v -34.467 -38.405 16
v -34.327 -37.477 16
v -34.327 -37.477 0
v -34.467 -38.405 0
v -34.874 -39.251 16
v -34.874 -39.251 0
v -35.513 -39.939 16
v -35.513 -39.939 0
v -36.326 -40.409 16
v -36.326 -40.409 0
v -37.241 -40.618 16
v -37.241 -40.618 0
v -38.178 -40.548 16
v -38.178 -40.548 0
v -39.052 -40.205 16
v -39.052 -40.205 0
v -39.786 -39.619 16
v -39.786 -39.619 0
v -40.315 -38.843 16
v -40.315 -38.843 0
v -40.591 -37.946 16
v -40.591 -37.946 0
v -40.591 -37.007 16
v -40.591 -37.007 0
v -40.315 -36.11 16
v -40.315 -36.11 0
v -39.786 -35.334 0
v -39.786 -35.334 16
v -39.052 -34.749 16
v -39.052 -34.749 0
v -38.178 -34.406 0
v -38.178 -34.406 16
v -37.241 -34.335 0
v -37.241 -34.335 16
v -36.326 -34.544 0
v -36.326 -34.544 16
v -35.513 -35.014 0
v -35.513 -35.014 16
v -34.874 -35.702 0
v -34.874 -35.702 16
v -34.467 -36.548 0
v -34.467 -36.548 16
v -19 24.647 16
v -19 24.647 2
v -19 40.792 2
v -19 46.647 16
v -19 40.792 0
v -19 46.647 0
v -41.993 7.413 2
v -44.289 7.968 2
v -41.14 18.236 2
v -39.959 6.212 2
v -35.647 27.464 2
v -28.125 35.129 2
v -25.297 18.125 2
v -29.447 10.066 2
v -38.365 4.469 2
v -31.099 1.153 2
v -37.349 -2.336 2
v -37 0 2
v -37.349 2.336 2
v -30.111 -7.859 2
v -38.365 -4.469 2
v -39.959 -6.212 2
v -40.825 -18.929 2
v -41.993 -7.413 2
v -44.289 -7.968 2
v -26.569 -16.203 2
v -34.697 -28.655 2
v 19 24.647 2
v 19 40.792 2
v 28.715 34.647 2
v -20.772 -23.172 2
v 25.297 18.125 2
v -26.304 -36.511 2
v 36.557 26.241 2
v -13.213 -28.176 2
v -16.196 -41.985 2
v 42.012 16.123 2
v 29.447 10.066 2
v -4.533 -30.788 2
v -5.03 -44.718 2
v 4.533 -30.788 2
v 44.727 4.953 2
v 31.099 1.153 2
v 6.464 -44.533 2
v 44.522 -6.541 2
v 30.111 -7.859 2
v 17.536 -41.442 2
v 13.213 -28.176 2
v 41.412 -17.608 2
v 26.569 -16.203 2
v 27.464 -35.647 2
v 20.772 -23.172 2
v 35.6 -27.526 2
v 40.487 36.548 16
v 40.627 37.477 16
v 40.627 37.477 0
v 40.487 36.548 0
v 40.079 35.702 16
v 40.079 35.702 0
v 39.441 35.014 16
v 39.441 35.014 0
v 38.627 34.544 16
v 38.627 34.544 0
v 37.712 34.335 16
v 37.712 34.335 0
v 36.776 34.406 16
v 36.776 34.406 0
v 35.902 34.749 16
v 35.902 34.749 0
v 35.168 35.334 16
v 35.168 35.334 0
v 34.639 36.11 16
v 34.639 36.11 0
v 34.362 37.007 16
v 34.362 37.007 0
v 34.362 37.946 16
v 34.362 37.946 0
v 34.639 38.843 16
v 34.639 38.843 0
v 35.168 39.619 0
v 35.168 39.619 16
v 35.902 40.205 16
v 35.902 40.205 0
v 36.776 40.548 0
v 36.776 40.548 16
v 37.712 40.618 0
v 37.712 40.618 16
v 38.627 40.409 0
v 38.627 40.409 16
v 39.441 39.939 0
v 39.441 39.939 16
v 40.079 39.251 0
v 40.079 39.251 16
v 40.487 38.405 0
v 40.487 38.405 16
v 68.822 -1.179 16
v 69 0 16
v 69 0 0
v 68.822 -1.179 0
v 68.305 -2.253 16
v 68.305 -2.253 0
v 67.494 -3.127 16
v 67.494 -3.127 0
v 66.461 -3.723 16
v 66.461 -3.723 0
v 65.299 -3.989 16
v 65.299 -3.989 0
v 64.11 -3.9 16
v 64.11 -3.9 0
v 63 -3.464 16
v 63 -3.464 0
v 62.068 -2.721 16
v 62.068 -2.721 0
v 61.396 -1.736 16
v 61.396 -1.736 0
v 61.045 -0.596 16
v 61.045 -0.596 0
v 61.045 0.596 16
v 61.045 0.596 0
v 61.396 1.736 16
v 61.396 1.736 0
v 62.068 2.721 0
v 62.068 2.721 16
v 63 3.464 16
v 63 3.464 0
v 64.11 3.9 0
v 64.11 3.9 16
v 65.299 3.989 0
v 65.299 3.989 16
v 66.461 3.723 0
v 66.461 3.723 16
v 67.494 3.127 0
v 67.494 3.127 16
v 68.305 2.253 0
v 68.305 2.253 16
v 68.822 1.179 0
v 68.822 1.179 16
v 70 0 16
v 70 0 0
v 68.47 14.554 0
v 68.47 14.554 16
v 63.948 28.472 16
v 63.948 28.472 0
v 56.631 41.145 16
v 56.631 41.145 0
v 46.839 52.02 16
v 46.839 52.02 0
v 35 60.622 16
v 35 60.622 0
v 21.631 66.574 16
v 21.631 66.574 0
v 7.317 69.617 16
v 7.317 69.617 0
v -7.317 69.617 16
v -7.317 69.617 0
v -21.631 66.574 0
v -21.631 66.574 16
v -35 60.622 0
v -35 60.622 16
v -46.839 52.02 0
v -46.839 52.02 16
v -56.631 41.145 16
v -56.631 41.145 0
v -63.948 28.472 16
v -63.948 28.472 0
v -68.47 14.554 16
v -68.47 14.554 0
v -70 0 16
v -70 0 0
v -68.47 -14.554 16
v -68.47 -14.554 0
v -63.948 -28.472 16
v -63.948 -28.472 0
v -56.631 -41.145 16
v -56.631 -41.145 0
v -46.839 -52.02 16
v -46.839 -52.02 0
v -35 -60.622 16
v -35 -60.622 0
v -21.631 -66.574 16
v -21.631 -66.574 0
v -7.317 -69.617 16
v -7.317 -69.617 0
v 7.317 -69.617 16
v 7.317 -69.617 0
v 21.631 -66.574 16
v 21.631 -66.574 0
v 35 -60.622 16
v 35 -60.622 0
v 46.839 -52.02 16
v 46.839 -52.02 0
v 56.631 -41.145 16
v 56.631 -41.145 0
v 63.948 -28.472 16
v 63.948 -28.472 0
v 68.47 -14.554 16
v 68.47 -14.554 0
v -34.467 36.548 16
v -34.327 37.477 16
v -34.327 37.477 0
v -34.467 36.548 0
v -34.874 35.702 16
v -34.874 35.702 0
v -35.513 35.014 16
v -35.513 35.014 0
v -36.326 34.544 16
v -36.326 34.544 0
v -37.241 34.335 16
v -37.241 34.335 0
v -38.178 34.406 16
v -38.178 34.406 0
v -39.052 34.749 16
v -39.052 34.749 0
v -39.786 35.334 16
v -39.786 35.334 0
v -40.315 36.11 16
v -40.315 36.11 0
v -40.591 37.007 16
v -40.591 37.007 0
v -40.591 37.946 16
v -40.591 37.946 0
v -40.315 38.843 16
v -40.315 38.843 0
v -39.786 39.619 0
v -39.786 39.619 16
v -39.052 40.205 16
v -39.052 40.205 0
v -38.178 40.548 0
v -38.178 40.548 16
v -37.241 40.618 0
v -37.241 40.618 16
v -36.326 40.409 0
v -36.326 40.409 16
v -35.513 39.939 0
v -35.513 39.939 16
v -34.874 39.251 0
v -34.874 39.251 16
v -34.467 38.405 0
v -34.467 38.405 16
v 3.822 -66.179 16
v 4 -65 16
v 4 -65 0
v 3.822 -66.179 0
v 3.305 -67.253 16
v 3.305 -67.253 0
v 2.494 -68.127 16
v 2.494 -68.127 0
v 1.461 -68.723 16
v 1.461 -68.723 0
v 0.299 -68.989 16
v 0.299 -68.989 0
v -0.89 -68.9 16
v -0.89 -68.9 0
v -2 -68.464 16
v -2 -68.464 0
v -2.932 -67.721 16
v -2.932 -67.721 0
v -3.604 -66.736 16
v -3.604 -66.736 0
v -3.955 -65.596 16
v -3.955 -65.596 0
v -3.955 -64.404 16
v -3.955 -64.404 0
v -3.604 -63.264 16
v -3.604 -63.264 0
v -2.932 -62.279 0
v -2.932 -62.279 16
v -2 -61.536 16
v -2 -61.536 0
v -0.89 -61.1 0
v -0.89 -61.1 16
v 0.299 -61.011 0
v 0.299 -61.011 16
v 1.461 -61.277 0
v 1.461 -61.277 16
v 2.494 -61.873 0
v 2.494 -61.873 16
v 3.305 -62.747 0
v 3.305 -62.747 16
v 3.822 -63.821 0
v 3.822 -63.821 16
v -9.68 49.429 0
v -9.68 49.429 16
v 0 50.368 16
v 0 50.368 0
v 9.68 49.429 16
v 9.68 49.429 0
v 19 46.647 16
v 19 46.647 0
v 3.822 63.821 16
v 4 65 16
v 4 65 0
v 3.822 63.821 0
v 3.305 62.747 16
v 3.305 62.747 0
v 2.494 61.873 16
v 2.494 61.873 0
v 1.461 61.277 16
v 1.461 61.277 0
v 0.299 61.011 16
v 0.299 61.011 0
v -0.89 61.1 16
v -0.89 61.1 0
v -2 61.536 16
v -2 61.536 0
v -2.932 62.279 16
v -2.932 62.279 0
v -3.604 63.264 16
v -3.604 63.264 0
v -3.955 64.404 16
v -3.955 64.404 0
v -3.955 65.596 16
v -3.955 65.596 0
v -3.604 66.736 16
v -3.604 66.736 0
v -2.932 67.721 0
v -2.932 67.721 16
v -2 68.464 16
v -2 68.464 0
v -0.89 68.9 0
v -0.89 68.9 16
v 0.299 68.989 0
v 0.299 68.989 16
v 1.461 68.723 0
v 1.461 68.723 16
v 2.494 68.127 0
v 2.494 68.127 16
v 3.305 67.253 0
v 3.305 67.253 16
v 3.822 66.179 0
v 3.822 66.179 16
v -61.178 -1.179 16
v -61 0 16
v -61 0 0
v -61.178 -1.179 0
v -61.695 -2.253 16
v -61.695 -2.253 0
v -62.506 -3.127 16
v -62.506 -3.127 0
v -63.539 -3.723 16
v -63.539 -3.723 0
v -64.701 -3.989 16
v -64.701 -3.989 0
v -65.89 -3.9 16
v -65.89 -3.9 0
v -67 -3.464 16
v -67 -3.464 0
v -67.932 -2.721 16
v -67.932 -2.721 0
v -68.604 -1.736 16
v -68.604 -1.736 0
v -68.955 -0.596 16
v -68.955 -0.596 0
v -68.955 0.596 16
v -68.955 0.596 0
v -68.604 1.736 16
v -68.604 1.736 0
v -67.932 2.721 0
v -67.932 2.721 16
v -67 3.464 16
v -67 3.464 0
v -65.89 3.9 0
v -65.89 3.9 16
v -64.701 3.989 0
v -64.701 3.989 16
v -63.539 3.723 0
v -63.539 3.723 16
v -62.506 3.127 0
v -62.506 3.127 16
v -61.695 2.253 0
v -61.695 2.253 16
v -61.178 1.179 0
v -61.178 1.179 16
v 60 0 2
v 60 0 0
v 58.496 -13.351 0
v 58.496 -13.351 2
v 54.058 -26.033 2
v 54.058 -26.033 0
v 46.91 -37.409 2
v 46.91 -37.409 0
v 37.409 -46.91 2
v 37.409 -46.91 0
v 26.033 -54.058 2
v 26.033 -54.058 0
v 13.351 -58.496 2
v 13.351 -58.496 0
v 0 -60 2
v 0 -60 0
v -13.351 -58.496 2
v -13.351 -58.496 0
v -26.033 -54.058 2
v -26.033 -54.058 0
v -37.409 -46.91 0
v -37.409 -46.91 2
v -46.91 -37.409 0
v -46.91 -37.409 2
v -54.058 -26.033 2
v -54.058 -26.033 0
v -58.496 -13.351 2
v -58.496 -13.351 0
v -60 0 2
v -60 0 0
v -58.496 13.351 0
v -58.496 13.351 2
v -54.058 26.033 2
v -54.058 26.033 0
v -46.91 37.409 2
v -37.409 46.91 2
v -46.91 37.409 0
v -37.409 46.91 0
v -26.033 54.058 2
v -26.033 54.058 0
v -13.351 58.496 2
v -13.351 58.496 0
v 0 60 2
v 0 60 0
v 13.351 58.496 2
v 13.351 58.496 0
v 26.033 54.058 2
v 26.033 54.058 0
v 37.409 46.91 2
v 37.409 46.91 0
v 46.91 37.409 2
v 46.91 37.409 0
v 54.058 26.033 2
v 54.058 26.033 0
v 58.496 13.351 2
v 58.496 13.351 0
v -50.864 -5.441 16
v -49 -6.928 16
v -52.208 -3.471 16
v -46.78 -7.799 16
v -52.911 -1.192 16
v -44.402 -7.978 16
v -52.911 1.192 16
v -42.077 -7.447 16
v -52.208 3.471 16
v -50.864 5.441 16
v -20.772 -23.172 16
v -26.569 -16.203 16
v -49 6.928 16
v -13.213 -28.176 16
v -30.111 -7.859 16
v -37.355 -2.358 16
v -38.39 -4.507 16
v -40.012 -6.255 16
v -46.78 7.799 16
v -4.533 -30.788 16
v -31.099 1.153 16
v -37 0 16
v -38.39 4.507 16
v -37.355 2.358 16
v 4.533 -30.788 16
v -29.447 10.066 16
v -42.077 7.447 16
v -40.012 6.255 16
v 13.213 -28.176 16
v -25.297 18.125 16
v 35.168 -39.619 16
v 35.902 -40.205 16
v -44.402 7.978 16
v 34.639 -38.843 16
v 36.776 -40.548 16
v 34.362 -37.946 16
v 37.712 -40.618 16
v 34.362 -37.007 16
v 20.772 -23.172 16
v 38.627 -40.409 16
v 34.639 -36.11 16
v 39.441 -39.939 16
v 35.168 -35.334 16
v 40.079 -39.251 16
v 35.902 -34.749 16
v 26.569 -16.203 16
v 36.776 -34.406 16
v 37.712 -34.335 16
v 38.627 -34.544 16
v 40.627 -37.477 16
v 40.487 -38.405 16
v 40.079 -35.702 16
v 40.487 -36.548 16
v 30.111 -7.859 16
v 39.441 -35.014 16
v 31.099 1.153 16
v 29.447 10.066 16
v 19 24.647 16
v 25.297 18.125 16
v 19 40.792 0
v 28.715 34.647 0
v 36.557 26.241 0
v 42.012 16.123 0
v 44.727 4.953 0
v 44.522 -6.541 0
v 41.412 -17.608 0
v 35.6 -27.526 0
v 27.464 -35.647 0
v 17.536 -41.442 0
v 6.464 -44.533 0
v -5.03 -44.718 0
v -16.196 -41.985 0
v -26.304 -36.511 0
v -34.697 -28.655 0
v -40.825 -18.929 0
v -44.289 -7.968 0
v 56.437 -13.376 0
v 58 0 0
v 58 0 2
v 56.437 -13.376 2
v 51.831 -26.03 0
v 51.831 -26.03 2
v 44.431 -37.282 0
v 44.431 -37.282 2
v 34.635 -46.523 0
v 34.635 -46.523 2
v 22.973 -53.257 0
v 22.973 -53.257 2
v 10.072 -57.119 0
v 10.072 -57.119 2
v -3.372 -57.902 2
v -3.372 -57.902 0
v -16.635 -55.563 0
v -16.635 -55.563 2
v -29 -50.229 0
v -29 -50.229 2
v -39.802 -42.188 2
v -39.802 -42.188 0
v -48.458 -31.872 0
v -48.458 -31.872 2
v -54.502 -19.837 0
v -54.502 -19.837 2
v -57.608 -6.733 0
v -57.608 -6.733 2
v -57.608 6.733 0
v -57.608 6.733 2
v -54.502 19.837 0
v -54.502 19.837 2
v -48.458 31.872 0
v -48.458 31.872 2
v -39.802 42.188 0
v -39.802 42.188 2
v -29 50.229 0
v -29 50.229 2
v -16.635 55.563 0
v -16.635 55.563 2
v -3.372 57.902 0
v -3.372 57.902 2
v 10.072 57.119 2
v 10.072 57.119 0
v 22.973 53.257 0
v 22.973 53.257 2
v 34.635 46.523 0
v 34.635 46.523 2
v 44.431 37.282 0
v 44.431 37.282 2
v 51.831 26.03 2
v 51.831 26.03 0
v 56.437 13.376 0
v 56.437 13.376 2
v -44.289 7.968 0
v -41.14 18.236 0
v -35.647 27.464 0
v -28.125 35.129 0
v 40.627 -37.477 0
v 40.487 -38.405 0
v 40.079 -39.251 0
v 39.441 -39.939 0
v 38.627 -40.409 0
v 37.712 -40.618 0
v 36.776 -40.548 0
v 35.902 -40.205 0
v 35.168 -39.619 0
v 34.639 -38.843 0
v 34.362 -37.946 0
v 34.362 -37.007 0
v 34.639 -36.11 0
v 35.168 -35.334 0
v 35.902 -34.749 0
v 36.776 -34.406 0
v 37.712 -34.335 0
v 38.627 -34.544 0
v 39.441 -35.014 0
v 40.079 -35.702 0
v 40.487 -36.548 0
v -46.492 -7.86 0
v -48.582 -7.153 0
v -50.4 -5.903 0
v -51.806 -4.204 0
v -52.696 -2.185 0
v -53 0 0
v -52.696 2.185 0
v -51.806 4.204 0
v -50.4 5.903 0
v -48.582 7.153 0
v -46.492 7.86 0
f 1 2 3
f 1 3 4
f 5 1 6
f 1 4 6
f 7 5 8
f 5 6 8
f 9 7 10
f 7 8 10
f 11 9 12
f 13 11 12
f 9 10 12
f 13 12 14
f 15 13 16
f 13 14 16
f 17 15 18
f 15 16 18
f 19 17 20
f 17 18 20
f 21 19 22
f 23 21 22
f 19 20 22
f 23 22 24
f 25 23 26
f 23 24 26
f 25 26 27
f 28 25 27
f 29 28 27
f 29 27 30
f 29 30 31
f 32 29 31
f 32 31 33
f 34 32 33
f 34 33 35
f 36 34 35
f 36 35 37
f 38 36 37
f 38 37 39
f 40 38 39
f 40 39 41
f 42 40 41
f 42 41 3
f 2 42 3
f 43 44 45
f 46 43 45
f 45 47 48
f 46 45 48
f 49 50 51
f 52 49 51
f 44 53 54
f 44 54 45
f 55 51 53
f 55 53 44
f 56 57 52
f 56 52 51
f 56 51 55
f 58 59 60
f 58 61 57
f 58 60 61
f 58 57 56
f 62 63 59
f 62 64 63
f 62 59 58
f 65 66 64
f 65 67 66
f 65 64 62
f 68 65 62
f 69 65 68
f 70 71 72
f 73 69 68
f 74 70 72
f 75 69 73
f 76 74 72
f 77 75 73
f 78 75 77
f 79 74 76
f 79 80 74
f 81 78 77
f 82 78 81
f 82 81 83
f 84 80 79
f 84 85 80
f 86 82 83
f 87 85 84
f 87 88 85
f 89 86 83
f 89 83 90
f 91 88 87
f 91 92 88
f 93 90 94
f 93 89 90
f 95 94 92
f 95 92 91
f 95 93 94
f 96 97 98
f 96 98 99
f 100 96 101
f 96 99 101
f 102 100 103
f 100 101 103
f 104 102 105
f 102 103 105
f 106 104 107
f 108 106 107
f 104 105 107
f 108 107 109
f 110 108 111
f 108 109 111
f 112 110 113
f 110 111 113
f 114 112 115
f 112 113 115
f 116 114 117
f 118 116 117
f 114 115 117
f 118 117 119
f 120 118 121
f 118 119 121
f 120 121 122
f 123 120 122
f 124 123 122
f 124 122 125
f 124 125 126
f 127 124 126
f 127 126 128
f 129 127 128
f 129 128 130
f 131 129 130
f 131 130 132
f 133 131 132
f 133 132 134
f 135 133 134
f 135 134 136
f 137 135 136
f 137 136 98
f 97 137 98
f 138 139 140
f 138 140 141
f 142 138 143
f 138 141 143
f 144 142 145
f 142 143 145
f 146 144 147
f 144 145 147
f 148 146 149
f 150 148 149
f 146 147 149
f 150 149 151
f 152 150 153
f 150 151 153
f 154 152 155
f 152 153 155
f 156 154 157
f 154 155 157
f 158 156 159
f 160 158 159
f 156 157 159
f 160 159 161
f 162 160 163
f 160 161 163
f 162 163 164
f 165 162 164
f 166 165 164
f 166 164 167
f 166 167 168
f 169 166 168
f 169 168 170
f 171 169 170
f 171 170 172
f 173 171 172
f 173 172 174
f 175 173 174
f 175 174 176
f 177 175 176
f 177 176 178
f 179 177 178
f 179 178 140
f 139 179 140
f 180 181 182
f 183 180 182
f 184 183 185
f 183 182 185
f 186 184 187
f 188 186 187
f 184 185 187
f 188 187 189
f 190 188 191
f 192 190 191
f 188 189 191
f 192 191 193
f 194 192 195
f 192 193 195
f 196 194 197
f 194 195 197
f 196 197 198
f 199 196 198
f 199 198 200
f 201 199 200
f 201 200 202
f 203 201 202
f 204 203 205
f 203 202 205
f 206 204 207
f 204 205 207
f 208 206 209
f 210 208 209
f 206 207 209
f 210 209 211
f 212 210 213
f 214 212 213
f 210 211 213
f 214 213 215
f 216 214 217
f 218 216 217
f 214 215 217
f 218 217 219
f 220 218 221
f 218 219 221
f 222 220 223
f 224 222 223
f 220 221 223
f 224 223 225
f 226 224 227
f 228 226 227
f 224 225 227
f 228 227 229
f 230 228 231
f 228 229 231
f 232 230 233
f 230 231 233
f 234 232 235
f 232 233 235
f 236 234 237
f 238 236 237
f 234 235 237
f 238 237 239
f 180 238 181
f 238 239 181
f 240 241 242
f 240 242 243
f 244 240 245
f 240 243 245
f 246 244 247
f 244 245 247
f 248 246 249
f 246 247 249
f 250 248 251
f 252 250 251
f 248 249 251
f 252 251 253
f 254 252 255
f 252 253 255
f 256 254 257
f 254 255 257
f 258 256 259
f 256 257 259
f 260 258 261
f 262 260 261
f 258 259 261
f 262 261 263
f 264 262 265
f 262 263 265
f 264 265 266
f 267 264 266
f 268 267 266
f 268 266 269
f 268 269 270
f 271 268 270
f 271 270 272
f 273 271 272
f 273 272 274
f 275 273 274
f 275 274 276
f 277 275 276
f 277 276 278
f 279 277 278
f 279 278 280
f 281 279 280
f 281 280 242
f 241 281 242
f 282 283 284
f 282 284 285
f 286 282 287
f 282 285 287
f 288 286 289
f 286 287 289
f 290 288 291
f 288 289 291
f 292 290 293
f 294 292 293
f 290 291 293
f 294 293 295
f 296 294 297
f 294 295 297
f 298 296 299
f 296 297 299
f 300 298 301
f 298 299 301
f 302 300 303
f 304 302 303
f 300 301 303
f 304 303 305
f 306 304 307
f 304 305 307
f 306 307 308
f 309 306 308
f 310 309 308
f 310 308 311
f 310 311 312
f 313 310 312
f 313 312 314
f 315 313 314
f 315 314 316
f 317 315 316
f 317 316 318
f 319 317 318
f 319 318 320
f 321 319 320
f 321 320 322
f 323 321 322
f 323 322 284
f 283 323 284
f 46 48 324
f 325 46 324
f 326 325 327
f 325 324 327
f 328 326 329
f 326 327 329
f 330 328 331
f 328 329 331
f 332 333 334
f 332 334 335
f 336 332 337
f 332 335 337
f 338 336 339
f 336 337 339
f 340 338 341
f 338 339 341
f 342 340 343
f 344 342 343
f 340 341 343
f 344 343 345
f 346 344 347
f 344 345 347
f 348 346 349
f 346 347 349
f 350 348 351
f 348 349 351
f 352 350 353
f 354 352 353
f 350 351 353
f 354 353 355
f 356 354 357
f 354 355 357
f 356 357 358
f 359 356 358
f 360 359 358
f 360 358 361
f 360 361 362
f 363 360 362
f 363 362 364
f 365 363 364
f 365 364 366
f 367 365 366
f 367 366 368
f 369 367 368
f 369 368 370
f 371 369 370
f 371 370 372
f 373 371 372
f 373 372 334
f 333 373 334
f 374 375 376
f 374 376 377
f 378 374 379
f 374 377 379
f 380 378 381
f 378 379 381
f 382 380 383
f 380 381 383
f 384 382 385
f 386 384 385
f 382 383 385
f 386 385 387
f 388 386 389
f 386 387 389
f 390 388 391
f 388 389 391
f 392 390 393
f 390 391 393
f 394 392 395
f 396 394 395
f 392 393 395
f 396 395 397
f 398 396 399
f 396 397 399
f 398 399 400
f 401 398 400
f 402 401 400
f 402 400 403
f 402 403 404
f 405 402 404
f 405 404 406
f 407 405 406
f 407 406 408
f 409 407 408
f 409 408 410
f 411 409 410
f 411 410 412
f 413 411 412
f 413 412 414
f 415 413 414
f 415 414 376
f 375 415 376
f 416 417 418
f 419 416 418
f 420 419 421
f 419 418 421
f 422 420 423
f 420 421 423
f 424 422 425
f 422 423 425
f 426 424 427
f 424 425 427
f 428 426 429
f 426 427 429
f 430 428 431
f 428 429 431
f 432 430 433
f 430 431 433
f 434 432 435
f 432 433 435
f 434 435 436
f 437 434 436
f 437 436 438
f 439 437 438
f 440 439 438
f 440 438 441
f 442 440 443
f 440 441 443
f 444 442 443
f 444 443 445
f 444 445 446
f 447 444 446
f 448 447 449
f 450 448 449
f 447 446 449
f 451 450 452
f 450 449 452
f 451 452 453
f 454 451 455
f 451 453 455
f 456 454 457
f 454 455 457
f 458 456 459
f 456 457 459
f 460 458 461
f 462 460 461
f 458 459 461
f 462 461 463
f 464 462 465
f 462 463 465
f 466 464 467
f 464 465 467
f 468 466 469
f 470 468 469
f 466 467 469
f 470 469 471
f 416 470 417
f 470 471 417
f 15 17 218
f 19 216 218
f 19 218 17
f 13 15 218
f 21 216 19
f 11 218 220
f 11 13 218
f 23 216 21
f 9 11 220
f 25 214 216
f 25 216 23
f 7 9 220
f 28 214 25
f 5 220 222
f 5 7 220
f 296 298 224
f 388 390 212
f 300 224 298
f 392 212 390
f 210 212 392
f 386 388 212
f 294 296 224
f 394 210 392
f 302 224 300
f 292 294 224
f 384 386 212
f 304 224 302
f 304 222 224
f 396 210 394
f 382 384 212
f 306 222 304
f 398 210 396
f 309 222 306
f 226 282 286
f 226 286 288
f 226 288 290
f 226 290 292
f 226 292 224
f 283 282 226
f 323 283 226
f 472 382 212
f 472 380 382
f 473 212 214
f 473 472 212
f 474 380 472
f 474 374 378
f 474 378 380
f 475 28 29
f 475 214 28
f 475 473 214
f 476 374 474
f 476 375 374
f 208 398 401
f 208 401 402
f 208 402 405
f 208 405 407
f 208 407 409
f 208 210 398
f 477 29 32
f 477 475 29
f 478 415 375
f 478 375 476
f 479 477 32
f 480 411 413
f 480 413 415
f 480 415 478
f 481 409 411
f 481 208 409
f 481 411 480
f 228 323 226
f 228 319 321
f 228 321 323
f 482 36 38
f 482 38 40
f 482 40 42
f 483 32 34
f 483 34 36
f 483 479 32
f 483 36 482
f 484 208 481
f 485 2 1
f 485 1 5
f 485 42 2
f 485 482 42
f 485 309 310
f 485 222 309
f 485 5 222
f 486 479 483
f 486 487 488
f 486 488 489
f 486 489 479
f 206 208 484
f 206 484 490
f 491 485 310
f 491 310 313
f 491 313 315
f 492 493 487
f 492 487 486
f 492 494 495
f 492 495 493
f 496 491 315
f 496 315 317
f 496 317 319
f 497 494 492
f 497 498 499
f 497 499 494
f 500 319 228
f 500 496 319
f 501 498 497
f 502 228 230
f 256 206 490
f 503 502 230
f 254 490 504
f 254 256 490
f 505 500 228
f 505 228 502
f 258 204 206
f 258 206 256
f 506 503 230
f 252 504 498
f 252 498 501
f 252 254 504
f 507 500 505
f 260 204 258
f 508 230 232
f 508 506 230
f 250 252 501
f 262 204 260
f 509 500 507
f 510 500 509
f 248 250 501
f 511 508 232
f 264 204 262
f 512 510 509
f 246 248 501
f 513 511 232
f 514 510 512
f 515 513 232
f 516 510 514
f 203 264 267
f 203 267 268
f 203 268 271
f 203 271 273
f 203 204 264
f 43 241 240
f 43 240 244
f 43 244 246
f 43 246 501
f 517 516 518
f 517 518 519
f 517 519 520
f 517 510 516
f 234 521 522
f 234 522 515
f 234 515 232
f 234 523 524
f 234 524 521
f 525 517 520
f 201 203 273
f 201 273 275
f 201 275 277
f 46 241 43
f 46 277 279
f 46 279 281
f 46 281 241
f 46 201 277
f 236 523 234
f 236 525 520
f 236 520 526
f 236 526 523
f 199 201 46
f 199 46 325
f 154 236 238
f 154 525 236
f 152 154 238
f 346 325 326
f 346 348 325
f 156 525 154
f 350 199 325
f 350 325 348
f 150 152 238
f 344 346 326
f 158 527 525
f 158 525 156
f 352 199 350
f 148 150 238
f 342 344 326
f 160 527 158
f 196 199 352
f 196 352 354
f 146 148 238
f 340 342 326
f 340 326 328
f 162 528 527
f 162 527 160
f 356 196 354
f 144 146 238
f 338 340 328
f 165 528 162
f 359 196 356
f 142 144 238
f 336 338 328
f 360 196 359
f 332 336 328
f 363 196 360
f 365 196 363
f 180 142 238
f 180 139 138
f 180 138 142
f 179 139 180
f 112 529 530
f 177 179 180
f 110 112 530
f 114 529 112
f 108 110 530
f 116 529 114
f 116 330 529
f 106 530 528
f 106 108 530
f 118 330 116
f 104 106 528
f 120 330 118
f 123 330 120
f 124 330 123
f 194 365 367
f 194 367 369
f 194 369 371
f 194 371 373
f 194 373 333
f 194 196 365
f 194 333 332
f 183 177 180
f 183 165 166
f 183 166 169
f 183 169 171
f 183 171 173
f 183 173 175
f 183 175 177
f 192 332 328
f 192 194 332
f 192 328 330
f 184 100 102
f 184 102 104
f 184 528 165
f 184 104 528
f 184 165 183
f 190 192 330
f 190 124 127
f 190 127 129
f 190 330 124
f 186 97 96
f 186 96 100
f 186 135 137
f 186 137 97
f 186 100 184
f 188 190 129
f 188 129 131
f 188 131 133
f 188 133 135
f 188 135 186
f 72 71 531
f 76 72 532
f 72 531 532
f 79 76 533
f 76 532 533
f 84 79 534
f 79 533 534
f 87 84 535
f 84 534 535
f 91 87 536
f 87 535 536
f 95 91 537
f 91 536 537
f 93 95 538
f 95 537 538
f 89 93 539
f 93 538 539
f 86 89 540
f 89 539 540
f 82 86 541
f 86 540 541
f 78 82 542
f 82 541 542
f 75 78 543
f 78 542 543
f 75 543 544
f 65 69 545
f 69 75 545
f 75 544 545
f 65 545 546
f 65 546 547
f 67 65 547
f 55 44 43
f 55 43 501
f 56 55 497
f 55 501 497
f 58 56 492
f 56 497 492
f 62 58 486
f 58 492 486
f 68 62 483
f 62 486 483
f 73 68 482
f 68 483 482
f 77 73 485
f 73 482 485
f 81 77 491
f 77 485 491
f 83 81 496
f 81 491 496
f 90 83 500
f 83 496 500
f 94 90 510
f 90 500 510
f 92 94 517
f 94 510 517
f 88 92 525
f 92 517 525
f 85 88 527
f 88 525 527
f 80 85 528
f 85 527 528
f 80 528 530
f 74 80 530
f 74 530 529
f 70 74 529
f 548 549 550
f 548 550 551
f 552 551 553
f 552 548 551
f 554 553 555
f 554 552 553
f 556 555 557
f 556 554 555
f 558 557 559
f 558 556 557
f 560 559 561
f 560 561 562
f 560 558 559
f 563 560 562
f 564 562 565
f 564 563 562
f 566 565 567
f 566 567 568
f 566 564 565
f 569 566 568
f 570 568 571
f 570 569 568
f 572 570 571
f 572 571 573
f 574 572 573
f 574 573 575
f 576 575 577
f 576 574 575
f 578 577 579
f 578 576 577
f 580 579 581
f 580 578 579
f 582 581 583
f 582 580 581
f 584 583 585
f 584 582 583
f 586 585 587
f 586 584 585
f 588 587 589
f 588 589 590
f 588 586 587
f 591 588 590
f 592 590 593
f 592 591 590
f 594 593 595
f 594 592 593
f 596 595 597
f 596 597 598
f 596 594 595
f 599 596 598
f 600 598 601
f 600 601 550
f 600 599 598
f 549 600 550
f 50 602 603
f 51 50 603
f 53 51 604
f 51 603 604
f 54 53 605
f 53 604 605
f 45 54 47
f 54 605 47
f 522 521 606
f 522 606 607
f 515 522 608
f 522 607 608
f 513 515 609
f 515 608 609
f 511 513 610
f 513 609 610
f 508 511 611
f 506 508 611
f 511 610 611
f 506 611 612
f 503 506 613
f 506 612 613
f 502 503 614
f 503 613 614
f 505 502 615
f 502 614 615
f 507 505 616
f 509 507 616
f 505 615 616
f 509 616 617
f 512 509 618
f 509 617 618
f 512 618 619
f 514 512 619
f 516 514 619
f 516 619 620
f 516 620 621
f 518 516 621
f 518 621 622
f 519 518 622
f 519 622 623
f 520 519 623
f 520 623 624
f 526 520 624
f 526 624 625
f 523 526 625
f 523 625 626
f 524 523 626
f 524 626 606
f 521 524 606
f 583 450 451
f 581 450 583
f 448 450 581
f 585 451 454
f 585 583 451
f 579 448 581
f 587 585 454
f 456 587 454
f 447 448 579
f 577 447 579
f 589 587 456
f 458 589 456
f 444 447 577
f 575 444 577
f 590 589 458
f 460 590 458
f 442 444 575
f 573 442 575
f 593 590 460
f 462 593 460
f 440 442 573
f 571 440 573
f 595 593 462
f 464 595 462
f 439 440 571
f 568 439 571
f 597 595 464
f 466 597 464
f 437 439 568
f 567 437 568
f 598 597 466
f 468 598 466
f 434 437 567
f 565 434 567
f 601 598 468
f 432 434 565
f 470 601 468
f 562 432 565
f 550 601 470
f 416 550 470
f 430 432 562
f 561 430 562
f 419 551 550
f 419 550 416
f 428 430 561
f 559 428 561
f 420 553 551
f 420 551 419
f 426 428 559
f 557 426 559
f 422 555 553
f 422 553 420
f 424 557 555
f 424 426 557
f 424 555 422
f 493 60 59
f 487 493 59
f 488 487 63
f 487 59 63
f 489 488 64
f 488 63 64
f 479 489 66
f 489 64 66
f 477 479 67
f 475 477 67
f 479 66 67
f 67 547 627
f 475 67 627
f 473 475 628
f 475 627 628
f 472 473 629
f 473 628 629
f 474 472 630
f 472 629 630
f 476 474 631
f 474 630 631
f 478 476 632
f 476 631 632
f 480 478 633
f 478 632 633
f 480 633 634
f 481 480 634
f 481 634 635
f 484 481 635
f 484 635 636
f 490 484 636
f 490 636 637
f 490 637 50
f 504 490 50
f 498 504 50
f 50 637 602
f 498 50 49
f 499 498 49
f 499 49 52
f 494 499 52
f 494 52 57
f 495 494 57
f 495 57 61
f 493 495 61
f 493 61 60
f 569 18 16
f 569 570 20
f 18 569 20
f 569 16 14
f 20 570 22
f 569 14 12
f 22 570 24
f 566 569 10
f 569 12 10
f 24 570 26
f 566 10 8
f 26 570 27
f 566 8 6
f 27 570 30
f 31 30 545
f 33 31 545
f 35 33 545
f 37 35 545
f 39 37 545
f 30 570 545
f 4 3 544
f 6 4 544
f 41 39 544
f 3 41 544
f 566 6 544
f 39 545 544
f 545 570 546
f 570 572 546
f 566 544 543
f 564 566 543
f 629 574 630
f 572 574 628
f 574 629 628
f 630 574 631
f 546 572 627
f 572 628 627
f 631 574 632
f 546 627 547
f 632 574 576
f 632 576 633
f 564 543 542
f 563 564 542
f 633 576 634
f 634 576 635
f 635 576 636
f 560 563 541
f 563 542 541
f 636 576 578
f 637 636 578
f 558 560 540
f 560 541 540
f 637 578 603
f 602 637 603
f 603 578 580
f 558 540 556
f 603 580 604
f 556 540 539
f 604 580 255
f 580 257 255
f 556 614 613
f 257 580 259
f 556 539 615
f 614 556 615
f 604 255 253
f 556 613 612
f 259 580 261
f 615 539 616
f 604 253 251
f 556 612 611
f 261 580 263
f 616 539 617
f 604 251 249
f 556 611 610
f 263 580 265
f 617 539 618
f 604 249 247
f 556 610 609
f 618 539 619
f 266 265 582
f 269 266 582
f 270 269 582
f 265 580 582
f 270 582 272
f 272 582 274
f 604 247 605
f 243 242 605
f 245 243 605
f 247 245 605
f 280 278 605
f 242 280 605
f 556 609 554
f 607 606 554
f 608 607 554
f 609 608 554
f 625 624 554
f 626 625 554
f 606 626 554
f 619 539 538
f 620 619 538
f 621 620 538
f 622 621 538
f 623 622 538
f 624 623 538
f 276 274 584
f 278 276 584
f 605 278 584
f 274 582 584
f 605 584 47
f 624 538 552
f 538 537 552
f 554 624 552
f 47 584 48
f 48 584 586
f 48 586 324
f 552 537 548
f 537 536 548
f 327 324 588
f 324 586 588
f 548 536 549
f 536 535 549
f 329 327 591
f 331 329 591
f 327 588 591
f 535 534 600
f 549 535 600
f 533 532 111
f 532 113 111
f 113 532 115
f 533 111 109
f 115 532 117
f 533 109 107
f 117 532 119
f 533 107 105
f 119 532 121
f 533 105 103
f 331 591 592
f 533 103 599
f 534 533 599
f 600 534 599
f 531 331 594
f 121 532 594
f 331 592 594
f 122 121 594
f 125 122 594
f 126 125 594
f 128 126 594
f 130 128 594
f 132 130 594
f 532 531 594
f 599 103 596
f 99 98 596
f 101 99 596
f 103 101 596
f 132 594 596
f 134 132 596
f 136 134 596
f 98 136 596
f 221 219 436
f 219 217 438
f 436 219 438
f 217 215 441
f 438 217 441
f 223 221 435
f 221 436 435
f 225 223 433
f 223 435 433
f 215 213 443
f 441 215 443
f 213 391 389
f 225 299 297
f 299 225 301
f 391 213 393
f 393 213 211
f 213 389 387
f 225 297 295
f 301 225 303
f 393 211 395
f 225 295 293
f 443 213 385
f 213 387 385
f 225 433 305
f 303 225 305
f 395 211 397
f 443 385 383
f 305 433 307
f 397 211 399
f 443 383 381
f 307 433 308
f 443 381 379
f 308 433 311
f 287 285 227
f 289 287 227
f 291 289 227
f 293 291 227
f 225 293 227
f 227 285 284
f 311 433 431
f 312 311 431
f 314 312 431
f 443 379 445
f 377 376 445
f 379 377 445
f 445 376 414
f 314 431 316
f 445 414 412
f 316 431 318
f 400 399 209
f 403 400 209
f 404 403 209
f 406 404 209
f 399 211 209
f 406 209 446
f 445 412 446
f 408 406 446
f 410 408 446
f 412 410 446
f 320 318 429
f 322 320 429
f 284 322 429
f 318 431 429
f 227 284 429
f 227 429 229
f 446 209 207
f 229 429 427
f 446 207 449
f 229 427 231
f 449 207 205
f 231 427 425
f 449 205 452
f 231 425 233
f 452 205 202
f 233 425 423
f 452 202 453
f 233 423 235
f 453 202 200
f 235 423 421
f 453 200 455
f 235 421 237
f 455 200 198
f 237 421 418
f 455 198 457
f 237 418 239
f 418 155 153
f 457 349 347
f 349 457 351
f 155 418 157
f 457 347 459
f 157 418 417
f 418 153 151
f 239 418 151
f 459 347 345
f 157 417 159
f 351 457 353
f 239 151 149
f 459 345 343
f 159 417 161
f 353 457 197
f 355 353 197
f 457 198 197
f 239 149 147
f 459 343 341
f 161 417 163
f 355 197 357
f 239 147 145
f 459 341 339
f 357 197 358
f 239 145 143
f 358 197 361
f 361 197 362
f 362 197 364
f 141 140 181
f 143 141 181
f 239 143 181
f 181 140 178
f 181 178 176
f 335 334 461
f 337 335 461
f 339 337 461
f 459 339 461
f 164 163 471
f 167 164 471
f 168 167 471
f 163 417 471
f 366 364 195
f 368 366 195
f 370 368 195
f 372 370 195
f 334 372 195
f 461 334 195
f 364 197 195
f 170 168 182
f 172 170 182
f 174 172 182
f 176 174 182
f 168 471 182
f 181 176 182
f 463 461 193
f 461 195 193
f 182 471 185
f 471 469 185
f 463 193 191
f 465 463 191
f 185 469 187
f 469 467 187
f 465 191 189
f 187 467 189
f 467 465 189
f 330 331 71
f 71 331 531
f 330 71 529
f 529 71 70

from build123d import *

# Parameters (mm, degrees)
F0_R     = 70
F1_DEPTH = 16
F2_R     = 31.12
F3_DEPTH = 16.001
F4_R     = 3.15
F4_R_2   = 8
F4_R_3   = 4
F5_DEPTH = 16.001
F6_R     = 45
F7_DEPTH = 2
F8_R     = 60
F8_R_2   = 58
F9_DEPTH = 2


with BuildPart() as f1:
    # F0 (on Top) → F1 (new body)
    with BuildSketch(Plane.XY):
        Circle(F0_R)
    extrude(amount=F1_DEPTH)

    # F2 (on face) → F3 (cut, through all)
    with BuildSketch(Plane.XY.offset(16)):
        Circle(F2_R)
    extrude(amount=-F3_DEPTH, mode=Mode.SUBTRACT)

    # F4 (on face) → F5 (cut, through all)
    with BuildSketch(Plane(origin=(0, 0, 0), x_dir=(1, 0, 0), z_dir=(0, 0, -1))):
        with BuildLine():
            Line((-19, -24.64659), (-19, -46.64659))
            ThreePointArc((-19, -46.64659), (0, -50.367692), (19, -46.64659))
            Line((19, -46.64659), (19, -24.64659))
            ThreePointArc((19, -24.64659), (0, -31.12), (-19, -24.64659))
        make_face()
        with Locations((-37.476659, -37.476659)):
            Circle(F4_R)
        with Locations((-45, 0)):
            Circle(F4_R_2)
        with Locations((-65, 0)):
            Circle(F4_R_3)
        with Locations((-37.476659, 37.476659)):
            Circle(F4_R)
        with Locations((37.476659, 37.476659)):
            Circle(F4_R)
        with Locations((37.476659, -37.476659)):
            Circle(F4_R)
        with Locations((65, 0)):
            Circle(F4_R_3)
        with Locations((0, 65)):
            Circle(F4_R_3)
        with Locations((0, -65)):
            Circle(F4_R_3)
    extrude(amount=-F5_DEPTH, mode=Mode.SUBTRACT)

    # F6 (on face) → F7 (cut)
    with BuildSketch(Plane(origin=(0, 0, 0), x_dir=(1, 0, 0), z_dir=(0, 0, -1))):
        Circle(F6_R)
    extrude(amount=-F7_DEPTH, mode=Mode.SUBTRACT)

    # F8 (on face) → F9 (cut)
    with BuildSketch(Plane(origin=(0, 0, 0), x_dir=(1, 0, 0), z_dir=(0, 0, -1))):
        Circle(F8_R)
        Circle(F8_R_2, mode=Mode.SUBTRACT)
    extrude(amount=-F9_DEPTH, mode=Mode.SUBTRACT)


solid = f1.part
